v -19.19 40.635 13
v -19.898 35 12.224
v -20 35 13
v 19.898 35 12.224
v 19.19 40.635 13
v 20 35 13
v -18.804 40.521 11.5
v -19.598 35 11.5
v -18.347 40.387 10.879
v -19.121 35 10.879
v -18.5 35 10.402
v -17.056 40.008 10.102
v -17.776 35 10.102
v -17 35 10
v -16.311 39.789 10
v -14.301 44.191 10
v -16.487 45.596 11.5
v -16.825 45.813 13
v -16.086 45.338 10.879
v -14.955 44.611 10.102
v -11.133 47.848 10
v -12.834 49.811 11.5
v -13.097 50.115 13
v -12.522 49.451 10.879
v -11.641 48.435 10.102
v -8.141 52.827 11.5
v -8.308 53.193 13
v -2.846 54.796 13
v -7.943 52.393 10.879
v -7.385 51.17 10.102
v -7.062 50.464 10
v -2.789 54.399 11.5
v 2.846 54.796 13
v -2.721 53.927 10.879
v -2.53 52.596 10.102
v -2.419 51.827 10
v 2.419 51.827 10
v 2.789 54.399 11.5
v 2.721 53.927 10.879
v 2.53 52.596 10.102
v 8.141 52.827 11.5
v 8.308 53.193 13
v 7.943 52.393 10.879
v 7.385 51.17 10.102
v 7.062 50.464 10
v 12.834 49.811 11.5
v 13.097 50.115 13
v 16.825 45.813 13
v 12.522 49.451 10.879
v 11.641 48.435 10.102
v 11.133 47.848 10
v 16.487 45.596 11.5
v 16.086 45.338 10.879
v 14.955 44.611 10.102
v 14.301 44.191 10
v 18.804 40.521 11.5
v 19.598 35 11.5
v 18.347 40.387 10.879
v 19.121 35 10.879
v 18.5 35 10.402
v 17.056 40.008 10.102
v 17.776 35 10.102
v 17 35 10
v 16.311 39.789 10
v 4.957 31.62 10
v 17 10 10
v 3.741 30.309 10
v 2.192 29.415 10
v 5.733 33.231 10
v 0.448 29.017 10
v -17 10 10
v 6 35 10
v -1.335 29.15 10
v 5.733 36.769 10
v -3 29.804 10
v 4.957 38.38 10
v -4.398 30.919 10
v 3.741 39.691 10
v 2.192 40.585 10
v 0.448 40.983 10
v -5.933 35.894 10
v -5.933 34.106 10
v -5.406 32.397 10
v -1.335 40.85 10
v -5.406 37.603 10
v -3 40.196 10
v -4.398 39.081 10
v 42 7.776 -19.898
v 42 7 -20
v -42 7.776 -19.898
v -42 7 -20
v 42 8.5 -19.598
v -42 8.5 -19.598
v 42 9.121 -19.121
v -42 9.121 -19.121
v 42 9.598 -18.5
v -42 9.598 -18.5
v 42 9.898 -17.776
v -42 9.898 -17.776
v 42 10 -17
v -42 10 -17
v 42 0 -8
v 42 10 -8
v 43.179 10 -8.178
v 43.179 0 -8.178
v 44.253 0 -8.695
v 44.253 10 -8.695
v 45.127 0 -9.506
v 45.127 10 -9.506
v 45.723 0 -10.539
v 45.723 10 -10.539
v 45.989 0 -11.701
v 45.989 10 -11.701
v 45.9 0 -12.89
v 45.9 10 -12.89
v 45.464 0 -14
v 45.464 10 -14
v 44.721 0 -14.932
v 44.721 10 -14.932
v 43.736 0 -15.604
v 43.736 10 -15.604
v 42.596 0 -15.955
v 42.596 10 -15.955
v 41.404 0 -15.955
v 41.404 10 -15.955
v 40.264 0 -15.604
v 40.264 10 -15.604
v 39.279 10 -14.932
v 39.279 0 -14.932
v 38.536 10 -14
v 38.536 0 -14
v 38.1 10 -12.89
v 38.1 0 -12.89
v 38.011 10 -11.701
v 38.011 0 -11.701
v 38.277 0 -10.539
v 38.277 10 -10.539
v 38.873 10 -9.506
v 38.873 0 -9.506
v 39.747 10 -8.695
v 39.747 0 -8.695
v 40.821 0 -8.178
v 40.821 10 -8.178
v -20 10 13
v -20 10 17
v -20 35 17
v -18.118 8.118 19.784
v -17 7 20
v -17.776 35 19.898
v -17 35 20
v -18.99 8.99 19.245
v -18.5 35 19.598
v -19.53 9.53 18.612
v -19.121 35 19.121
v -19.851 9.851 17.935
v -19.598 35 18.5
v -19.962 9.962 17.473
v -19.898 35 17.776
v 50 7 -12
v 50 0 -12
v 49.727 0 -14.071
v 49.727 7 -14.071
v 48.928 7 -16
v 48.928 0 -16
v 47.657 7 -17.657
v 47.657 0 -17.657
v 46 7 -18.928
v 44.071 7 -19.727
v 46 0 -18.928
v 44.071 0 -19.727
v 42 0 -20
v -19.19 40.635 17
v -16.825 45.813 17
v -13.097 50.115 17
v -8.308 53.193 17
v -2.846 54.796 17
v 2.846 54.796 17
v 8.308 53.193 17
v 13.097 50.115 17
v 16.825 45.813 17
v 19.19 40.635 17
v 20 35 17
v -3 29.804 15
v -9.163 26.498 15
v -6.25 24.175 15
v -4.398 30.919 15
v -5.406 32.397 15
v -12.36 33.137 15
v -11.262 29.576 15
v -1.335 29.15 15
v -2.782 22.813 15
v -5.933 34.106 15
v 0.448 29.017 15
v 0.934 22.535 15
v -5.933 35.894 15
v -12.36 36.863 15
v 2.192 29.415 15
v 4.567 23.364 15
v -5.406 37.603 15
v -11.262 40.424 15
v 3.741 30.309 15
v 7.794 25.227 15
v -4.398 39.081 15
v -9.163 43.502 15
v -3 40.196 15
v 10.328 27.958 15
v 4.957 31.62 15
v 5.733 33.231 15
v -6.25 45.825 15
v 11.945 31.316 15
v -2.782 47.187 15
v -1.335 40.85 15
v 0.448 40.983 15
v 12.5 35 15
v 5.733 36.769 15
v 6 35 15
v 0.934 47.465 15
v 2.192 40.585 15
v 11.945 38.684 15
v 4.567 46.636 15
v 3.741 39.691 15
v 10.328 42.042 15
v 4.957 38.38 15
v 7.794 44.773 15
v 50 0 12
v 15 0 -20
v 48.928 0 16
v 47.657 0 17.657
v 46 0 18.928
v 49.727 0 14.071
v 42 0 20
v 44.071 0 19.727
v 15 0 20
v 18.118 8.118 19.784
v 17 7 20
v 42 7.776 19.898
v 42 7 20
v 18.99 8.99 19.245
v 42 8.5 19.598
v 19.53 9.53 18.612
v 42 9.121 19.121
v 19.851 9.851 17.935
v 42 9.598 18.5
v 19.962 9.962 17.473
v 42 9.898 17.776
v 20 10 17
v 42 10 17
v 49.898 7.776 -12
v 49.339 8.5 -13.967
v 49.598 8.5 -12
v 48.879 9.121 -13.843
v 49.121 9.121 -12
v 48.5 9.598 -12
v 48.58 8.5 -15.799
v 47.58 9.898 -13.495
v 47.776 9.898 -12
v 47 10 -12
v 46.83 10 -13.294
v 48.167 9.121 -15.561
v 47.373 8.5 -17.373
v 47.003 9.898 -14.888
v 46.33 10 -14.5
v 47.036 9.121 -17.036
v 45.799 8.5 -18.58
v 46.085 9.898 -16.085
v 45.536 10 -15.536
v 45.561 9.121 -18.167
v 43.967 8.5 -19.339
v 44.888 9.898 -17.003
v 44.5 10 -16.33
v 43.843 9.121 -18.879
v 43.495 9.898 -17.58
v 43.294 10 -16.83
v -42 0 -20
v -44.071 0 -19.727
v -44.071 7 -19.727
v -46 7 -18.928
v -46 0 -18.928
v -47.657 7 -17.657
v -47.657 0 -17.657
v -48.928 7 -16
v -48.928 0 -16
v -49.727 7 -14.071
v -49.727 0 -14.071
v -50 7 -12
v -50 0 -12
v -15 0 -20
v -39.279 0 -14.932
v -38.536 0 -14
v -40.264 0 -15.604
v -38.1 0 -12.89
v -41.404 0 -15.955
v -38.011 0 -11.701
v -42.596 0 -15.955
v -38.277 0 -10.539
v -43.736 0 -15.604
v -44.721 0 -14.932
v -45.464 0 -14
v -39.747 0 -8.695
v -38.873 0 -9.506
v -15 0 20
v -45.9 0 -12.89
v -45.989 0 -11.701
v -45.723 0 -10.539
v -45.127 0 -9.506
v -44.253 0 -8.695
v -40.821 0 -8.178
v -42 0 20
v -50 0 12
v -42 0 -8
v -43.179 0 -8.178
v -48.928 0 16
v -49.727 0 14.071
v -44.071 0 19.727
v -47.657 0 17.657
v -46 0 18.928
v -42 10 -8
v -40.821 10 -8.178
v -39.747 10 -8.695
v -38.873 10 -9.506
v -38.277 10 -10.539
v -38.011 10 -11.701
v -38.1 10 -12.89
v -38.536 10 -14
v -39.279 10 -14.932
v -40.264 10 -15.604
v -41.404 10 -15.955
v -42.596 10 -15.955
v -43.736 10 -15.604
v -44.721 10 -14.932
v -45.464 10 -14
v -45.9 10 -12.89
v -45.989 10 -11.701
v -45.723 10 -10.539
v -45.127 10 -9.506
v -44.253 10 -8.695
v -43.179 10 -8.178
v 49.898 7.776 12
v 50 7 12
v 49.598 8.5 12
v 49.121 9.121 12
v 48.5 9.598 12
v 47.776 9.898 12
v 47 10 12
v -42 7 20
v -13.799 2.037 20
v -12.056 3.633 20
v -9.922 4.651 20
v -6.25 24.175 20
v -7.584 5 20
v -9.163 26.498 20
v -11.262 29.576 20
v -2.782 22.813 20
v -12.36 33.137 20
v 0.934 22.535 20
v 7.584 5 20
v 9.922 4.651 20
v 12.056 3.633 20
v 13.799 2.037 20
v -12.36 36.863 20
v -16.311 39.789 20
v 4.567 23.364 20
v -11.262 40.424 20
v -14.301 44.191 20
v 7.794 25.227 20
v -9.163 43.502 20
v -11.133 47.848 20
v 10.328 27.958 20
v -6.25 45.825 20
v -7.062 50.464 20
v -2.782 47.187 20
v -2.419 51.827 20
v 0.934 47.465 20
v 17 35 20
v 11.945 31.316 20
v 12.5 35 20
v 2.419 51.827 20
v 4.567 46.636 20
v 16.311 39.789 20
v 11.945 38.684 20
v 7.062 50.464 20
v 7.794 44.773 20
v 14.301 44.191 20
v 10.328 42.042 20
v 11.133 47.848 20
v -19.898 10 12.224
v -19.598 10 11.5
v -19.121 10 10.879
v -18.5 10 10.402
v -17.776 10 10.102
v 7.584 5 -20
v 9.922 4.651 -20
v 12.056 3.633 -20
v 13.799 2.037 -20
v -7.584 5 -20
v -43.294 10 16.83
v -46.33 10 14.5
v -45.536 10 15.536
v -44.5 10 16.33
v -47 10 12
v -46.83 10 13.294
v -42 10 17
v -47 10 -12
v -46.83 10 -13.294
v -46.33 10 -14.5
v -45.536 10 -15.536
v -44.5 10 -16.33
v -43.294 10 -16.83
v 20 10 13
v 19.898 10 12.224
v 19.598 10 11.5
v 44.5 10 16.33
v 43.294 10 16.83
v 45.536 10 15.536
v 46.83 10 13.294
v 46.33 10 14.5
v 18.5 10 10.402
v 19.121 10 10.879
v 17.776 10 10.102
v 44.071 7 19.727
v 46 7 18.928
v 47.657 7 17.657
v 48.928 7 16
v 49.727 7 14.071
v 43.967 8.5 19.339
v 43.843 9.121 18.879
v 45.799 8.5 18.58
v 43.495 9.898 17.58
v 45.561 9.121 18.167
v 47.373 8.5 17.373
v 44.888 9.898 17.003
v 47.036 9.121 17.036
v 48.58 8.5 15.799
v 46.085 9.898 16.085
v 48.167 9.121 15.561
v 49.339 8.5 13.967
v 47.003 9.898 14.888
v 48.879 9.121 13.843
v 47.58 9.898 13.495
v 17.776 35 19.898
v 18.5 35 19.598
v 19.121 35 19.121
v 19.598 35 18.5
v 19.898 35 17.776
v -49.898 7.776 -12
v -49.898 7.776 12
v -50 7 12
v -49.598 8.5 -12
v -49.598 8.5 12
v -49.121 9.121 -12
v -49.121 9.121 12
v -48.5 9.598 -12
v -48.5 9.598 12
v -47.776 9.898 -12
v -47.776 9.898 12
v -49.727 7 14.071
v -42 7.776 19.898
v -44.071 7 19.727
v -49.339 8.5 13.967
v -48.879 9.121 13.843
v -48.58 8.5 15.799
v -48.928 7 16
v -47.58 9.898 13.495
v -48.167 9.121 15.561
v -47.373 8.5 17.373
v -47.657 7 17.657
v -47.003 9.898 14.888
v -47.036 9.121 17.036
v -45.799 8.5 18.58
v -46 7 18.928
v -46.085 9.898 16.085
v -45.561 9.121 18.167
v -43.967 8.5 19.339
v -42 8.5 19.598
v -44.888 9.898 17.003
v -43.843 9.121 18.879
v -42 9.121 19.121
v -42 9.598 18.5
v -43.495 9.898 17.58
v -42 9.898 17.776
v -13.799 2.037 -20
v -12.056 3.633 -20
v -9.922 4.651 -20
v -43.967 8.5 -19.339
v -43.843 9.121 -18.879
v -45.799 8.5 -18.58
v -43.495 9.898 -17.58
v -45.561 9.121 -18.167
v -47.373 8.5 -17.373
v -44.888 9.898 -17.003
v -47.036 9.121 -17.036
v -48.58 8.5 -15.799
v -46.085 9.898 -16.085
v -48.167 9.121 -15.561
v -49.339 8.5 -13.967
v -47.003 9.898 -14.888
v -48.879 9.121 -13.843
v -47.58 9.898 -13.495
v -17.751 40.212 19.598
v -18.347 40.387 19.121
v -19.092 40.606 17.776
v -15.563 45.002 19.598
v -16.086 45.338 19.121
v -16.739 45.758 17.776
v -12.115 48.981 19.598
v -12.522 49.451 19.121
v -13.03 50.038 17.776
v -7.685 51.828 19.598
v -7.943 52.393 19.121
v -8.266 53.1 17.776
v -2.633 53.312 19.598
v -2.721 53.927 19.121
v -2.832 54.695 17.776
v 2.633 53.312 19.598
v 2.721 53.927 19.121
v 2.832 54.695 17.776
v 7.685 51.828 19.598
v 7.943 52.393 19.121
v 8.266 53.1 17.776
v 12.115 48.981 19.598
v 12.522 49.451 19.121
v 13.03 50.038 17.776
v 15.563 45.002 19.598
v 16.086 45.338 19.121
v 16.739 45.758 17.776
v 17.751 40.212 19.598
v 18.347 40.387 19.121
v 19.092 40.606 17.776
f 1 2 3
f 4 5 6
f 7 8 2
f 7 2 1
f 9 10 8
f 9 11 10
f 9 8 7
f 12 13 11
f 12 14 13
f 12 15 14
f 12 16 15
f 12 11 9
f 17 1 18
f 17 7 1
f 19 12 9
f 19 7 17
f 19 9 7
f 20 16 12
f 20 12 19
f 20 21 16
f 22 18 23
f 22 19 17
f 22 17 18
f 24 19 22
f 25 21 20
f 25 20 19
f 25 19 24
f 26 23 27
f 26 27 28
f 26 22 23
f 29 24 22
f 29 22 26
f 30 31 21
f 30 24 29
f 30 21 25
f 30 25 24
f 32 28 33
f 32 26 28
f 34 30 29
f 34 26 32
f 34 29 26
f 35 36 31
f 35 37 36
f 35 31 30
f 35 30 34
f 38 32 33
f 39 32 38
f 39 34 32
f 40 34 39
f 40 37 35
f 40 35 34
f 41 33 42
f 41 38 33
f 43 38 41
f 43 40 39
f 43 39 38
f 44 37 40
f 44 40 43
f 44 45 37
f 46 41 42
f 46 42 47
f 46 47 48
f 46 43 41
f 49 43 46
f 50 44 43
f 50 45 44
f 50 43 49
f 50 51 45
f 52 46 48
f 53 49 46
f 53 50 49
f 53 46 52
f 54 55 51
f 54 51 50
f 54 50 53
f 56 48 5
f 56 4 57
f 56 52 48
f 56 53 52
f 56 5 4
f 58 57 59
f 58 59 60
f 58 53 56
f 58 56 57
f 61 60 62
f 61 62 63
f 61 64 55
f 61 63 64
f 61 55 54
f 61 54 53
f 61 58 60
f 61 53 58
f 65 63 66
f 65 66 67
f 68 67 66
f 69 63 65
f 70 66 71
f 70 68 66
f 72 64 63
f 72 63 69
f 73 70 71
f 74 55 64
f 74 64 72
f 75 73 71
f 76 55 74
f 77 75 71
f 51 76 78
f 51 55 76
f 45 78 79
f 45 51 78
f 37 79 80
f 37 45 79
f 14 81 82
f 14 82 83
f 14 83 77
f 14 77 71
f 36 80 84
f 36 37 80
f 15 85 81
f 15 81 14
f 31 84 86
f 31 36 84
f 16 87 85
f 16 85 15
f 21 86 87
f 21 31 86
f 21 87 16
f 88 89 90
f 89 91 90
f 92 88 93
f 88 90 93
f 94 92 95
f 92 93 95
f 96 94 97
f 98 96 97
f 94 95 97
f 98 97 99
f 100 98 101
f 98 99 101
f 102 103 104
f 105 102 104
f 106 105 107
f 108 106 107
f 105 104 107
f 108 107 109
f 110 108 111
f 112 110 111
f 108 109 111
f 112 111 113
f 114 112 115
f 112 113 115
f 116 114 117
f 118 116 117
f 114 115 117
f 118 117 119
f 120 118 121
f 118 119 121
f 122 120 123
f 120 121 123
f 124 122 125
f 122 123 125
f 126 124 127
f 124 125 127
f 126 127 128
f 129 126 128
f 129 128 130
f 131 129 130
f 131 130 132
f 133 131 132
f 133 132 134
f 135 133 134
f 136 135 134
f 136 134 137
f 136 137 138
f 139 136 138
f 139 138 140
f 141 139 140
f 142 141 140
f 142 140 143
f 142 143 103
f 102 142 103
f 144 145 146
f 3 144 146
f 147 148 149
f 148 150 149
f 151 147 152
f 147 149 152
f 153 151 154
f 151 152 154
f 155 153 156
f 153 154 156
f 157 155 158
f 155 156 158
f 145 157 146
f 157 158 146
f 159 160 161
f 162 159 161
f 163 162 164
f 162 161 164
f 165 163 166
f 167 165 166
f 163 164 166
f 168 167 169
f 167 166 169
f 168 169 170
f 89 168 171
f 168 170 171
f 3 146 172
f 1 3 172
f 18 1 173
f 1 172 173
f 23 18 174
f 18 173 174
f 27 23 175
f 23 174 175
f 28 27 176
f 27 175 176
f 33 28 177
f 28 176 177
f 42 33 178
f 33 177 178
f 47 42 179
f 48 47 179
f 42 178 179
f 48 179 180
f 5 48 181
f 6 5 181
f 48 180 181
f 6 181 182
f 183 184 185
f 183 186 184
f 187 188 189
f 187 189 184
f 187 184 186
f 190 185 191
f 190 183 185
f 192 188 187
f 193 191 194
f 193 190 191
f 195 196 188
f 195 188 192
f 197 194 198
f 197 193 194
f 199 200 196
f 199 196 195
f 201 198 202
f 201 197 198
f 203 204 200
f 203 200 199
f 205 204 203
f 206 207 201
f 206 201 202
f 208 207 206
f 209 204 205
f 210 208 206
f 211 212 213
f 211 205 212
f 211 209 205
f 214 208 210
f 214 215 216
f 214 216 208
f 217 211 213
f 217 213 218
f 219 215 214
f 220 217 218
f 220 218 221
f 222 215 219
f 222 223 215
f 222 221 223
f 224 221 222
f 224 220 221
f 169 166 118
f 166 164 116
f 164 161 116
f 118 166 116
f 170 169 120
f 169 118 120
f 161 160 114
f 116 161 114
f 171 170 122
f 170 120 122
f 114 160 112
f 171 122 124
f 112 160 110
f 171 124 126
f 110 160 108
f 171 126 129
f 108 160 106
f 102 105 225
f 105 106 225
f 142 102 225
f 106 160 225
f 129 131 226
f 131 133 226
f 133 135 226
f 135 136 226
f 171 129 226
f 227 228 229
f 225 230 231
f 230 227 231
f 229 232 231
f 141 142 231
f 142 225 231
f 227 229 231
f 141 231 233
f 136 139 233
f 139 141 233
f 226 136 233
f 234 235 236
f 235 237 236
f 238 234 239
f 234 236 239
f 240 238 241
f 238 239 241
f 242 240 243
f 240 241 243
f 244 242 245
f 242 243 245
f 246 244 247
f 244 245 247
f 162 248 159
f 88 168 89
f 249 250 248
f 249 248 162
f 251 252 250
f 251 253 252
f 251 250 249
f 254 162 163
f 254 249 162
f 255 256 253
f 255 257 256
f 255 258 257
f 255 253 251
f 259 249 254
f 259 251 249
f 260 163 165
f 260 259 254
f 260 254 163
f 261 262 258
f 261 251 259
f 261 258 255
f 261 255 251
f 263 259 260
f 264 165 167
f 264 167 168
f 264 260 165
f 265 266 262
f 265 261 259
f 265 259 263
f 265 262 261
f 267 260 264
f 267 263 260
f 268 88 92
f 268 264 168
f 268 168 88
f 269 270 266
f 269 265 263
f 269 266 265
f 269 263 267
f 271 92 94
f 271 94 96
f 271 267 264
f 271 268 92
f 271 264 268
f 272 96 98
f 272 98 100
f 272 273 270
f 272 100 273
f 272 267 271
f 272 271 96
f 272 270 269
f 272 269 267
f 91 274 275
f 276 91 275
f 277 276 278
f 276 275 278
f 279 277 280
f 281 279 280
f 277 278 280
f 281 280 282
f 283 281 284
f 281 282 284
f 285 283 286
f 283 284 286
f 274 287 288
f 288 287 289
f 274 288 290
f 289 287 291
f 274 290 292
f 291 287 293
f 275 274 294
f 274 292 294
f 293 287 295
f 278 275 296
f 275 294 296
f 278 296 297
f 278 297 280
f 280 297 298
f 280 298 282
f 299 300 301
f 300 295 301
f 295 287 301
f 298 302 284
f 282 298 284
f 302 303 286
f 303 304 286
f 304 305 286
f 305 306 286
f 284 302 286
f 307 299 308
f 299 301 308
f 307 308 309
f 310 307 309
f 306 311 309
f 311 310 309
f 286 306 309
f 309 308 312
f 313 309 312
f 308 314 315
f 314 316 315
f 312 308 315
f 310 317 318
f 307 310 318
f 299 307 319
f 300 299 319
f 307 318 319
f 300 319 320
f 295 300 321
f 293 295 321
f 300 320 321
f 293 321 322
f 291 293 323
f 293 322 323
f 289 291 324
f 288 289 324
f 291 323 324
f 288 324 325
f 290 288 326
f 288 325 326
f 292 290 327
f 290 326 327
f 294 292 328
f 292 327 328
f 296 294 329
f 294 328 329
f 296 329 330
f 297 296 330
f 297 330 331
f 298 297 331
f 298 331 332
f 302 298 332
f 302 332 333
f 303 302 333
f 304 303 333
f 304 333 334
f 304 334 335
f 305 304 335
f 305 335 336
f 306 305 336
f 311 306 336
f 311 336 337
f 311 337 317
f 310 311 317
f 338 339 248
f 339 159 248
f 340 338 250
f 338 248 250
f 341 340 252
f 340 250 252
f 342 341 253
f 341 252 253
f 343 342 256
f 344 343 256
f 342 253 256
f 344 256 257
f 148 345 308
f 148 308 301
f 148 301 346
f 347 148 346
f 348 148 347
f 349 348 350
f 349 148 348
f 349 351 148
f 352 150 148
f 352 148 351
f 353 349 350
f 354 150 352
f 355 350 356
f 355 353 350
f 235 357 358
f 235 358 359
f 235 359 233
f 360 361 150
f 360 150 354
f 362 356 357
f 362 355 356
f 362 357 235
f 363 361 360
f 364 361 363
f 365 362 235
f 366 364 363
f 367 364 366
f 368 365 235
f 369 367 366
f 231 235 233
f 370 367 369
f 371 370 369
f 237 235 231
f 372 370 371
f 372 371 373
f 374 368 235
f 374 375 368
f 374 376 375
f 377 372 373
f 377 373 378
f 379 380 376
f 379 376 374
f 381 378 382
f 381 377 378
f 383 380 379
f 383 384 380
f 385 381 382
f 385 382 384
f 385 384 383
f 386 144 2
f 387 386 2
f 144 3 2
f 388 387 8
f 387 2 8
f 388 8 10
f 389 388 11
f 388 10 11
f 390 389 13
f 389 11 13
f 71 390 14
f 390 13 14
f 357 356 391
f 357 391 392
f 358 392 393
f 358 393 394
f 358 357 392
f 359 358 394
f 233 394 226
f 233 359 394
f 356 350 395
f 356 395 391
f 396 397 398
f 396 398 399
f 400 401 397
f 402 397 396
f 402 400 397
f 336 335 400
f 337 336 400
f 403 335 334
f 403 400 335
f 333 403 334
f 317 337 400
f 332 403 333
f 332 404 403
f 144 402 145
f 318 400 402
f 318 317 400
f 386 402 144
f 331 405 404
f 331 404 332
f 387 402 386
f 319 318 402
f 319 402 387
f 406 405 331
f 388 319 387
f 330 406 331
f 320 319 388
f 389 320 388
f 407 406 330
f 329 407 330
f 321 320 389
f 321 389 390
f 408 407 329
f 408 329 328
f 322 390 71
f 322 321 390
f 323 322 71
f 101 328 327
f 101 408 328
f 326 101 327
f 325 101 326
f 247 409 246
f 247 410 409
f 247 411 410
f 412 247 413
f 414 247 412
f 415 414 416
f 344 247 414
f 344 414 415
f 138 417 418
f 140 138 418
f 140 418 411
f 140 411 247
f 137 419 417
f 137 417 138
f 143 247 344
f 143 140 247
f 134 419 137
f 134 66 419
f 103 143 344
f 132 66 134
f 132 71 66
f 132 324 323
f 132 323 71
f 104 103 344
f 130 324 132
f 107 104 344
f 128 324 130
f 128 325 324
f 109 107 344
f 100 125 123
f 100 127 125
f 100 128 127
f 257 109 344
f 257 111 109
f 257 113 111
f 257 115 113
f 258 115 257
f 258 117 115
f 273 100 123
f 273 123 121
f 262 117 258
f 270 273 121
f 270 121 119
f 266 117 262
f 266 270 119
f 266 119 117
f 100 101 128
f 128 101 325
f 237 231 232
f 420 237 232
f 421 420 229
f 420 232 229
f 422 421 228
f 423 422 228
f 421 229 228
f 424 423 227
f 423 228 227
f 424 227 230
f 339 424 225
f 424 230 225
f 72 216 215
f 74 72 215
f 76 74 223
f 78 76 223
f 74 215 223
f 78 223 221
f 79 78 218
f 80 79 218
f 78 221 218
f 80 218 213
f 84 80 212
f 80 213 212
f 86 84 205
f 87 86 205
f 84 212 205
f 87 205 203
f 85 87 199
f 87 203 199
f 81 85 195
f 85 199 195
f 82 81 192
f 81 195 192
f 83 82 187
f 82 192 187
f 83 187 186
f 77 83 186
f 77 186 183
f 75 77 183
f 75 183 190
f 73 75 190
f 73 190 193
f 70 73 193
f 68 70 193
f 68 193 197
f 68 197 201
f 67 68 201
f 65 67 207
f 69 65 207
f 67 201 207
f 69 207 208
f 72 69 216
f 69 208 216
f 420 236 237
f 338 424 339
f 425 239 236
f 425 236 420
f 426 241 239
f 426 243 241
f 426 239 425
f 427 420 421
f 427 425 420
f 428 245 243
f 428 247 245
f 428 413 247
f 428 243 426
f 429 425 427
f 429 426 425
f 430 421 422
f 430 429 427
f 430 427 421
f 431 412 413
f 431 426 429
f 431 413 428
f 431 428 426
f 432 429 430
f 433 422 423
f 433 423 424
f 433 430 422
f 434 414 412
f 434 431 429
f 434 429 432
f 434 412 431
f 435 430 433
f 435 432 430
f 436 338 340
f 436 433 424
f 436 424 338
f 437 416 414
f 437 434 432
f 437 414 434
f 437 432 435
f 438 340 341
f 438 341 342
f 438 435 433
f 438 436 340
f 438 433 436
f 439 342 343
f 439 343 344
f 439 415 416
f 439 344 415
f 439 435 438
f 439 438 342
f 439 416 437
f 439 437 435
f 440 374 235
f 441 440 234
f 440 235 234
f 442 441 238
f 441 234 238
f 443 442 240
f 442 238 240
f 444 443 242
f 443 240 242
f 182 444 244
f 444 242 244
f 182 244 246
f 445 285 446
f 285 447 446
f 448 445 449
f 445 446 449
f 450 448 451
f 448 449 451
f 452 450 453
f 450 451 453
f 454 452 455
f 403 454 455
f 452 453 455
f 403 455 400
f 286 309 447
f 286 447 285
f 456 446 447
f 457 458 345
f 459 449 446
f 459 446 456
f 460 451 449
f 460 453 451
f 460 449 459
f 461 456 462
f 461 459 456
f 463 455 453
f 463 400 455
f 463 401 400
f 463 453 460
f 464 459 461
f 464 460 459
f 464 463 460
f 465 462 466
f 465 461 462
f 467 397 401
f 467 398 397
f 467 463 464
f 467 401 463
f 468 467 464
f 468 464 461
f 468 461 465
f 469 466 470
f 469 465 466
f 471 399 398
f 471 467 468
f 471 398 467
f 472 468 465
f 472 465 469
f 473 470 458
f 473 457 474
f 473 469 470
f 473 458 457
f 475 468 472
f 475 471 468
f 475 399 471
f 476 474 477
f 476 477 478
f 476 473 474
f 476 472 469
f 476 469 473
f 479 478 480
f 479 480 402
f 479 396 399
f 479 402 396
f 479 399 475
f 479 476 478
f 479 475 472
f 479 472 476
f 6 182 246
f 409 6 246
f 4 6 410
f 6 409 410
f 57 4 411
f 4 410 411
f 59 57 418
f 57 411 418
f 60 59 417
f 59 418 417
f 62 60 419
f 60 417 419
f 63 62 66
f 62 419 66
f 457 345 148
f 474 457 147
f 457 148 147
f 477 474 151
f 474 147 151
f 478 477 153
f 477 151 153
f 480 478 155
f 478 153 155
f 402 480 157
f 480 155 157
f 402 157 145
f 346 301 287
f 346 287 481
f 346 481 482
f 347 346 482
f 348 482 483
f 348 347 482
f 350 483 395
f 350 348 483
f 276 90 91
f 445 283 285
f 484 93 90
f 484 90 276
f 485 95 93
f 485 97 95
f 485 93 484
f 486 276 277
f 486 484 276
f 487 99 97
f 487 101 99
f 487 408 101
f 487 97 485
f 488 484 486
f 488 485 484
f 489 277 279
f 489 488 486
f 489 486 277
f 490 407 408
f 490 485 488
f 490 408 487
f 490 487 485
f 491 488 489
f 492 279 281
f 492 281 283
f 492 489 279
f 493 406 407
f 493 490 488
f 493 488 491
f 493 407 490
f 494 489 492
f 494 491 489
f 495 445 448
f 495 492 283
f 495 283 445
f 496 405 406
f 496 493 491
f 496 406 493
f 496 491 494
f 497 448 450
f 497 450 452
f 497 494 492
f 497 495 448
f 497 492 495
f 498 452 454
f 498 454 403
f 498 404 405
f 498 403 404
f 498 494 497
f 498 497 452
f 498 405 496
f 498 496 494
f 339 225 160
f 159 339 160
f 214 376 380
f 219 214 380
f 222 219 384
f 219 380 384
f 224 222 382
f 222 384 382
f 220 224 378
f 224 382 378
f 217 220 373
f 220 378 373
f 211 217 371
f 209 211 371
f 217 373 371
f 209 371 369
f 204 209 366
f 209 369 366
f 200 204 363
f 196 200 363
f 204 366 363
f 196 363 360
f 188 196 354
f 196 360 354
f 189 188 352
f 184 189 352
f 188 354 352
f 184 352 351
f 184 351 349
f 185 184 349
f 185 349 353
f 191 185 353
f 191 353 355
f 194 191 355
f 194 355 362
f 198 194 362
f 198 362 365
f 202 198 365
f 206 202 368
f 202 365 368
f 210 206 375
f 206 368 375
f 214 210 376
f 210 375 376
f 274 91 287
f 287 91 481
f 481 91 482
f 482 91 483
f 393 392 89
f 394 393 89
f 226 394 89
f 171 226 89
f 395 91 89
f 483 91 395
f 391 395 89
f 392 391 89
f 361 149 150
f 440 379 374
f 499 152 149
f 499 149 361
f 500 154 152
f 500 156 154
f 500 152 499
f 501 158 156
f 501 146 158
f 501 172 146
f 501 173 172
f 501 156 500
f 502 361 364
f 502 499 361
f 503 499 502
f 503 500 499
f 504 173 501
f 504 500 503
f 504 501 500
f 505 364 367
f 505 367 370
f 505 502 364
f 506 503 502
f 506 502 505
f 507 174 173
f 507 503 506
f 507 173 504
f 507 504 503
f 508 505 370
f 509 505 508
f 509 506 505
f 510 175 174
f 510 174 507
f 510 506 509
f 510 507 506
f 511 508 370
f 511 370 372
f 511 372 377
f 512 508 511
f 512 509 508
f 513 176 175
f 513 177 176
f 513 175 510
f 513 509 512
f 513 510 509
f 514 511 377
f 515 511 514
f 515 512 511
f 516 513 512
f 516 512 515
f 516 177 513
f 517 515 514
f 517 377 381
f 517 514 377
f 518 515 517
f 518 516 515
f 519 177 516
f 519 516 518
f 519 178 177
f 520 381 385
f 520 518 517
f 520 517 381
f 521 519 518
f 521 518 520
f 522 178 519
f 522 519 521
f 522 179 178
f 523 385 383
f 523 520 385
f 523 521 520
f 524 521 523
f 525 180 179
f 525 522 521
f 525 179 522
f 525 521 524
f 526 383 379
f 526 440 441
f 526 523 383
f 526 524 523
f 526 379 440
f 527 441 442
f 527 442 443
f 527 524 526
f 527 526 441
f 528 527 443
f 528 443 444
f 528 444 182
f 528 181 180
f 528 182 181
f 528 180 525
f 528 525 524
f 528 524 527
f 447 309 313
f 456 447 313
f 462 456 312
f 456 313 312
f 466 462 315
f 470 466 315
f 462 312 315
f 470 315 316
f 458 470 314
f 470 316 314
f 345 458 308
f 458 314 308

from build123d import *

# Parameters (mm, degrees)
SKETCH_1_W          = 100
SKETCH_1_H          = 40
EXTRUDE_1_DEPTH     = 10
EXTRUDE_2_DEPTH     = 10
SKETCH_3_R          = 12.5
CUT_EXTRUDE_1_DEPTH = 5
SKETCH_7_R          = 6
CUT_EXTRUDE_2_DEPTH = 5
SKETCH_10_W         = 30
SKETCH_10_H         = 5
CUT_EXTRUDE_3_DEPTH = 85.409715081
SKETCH_14_R         = 4
CUT_EXTRUDE_4_DEPTH = 71.178344238
FILLET_2_R          = 8
FILLET_3_R          = 3


with BuildPart() as part:
    # Эскиз1 → Бобышка-Вытянуть1 (new body)
    with BuildSketch(Plane(origin=(0, 0, 0), x_dir=(1, 0, 0), z_dir=(0, 1, 0))):
        Rectangle(SKETCH_1_W, SKETCH_1_H)
    extrude(amount=EXTRUDE_1_DEPTH)

    # Эскиз2 → Бобышка-Вытянуть2 (add)
    with BuildSketch(Plane.XY.offset(20)):
        with BuildLine():
            Line((-20, 0), (-20, 35))
            ThreePointArc((-20, 35), (0, 55), (20, 35))
            Line((20, 35), (20, 0))
            Line((20, 0), (-20, 0))
        make_face()
    extrude(amount=-EXTRUDE_2_DEPTH)

    # Эскиз3 → Вырез-Вытянуть1 (cut)
    with BuildSketch(Plane.XY.offset(20)):
        with Locations((0, 35)):
            Circle(SKETCH_3_R)
    extrude(amount=-CUT_EXTRUDE_1_DEPTH, mode=Mode.SUBTRACT)

    # Эскиз7 → Вырез-Вытянуть2 (cut)
    with BuildSketch(Plane.XY.offset(15)):
        with Locations((0, 35)):
            Circle(SKETCH_7_R)
    extrude(amount=-CUT_EXTRUDE_2_DEPTH, mode=Mode.SUBTRACT)

    # Эскиз10 → Вырез-Вытянуть3 (cut, through all)
    with BuildSketch(Plane.XY.offset(20)):
        with Locations((0, 2.5)):
            Rectangle(SKETCH_10_W, SKETCH_10_H)
    extrude(amount=-CUT_EXTRUDE_3_DEPTH, mode=Mode.SUBTRACT)

    # Эскиз14 → Вырез-Вытянуть4 (cut, through all)
    with BuildSketch(Plane(origin=(0, 10, 0), x_dir=(1, 0, 0), z_dir=(0, 1, 0))):
        with Locations(Location((-42, 12, 0), (0, 0, 270))):
            Circle(SKETCH_14_R)
        with Locations(Location((42, 12, 0), (0, 0, 270))):
            Circle(SKETCH_14_R)
    extrude(amount=-CUT_EXTRUDE_4_DEPTH, mode=Mode.SUBTRACT)

    # Скругление2
    # the kernel refuses this fillet: 8 mm, written as the material it adds along each edge
    with BuildSketch(Plane(origin=(-15, 5, 20), x_dir=(0, -1, 0), z_dir=(0, 0, -1))) as fillet_2_piece_1:
        with BuildLine():
            CenterArc((8, -7.416198487), FILLET_2_R, 112.024312837, 67.975687163)
            Line((0, -7.416198487), (0, 0))
            Line((0, 0), (5, 0))
        make_face()
    extrude(amount=40)
    with BuildSketch(Plane(origin=(15, 5, 20), x_dir=(-1, 0, 0), z_dir=(0, 0, -1))) as fillet_2_piece_2:
        with BuildLine():
            CenterArc((7.416198487, -8), FILLET_2_R, 90, 67.975687163)
            Line((0, -5), (0, 0))
            Line((0, 0), (7.416198487, 0))
        make_face()
    extrude(amount=40)
    # the kernel refuses this fillet: 8 mm, written as the material it takes off along each edge
    with BuildSketch(Plane(origin=(50, -20, 20), x_dir=(-1, 0, 0), z_dir=(0, 1, 0)), Plane(origin=(50, -20, -20), x_dir=(0, 0, 1), z_dir=(0, 1, 0))) as fillet_2_2_piece_1:
        with BuildLine():
            CenterArc((FILLET_2_R, -FILLET_2_R), FILLET_2_R, 90, 90)
            Line((0, -FILLET_2_R), (0, 0))
            Line((0, 0), (FILLET_2_R, 0))
        make_face()
    extrude(amount=50, mode=Mode.SUBTRACT)
    with BuildSketch(Plane(origin=(-50, -20, 20), x_dir=(1, 0, 0), z_dir=(0, 1, 0)), Plane(origin=(-50, -20, -20), x_dir=(0, 0, 1), z_dir=(0, 1, 0))) as fillet_2_2_piece_2:
        with BuildLine():
            CenterArc((FILLET_2_R, FILLET_2_R), FILLET_2_R, 180, 90)
            Line((0, FILLET_2_R), (0, 0))
            Line((0, 0), (FILLET_2_R, 0))
        make_face()
    extrude(amount=50, mode=Mode.SUBTRACT)

    # Скругление3
    fillet_3_edges = [part.edges().sort_by_distance(p)[0] for p in [
        (31, 10, 20),
        (-20, 22.5, 20),
        (20, 22.5, 10),
        (-20, 22.5, 10),
        (0, 55, 10),
        (20, 22.5, 20),
        (0, 55, 20),
        (50, 10, 0),
        (-31, 10, 20),
        (0, 10, -20),
        (-50, 10, 0),
        (47.656854249, 10, -17.656854249),
        (-47.656854249, 10, -17.656854249),
        (-47.656854249, 10, 17.656854249),
        (47.656854249, 10, 17.656854249),
    ]]
    fillet(fillet_3_edges, radius=FILLET_3_R)


solid = part.part
